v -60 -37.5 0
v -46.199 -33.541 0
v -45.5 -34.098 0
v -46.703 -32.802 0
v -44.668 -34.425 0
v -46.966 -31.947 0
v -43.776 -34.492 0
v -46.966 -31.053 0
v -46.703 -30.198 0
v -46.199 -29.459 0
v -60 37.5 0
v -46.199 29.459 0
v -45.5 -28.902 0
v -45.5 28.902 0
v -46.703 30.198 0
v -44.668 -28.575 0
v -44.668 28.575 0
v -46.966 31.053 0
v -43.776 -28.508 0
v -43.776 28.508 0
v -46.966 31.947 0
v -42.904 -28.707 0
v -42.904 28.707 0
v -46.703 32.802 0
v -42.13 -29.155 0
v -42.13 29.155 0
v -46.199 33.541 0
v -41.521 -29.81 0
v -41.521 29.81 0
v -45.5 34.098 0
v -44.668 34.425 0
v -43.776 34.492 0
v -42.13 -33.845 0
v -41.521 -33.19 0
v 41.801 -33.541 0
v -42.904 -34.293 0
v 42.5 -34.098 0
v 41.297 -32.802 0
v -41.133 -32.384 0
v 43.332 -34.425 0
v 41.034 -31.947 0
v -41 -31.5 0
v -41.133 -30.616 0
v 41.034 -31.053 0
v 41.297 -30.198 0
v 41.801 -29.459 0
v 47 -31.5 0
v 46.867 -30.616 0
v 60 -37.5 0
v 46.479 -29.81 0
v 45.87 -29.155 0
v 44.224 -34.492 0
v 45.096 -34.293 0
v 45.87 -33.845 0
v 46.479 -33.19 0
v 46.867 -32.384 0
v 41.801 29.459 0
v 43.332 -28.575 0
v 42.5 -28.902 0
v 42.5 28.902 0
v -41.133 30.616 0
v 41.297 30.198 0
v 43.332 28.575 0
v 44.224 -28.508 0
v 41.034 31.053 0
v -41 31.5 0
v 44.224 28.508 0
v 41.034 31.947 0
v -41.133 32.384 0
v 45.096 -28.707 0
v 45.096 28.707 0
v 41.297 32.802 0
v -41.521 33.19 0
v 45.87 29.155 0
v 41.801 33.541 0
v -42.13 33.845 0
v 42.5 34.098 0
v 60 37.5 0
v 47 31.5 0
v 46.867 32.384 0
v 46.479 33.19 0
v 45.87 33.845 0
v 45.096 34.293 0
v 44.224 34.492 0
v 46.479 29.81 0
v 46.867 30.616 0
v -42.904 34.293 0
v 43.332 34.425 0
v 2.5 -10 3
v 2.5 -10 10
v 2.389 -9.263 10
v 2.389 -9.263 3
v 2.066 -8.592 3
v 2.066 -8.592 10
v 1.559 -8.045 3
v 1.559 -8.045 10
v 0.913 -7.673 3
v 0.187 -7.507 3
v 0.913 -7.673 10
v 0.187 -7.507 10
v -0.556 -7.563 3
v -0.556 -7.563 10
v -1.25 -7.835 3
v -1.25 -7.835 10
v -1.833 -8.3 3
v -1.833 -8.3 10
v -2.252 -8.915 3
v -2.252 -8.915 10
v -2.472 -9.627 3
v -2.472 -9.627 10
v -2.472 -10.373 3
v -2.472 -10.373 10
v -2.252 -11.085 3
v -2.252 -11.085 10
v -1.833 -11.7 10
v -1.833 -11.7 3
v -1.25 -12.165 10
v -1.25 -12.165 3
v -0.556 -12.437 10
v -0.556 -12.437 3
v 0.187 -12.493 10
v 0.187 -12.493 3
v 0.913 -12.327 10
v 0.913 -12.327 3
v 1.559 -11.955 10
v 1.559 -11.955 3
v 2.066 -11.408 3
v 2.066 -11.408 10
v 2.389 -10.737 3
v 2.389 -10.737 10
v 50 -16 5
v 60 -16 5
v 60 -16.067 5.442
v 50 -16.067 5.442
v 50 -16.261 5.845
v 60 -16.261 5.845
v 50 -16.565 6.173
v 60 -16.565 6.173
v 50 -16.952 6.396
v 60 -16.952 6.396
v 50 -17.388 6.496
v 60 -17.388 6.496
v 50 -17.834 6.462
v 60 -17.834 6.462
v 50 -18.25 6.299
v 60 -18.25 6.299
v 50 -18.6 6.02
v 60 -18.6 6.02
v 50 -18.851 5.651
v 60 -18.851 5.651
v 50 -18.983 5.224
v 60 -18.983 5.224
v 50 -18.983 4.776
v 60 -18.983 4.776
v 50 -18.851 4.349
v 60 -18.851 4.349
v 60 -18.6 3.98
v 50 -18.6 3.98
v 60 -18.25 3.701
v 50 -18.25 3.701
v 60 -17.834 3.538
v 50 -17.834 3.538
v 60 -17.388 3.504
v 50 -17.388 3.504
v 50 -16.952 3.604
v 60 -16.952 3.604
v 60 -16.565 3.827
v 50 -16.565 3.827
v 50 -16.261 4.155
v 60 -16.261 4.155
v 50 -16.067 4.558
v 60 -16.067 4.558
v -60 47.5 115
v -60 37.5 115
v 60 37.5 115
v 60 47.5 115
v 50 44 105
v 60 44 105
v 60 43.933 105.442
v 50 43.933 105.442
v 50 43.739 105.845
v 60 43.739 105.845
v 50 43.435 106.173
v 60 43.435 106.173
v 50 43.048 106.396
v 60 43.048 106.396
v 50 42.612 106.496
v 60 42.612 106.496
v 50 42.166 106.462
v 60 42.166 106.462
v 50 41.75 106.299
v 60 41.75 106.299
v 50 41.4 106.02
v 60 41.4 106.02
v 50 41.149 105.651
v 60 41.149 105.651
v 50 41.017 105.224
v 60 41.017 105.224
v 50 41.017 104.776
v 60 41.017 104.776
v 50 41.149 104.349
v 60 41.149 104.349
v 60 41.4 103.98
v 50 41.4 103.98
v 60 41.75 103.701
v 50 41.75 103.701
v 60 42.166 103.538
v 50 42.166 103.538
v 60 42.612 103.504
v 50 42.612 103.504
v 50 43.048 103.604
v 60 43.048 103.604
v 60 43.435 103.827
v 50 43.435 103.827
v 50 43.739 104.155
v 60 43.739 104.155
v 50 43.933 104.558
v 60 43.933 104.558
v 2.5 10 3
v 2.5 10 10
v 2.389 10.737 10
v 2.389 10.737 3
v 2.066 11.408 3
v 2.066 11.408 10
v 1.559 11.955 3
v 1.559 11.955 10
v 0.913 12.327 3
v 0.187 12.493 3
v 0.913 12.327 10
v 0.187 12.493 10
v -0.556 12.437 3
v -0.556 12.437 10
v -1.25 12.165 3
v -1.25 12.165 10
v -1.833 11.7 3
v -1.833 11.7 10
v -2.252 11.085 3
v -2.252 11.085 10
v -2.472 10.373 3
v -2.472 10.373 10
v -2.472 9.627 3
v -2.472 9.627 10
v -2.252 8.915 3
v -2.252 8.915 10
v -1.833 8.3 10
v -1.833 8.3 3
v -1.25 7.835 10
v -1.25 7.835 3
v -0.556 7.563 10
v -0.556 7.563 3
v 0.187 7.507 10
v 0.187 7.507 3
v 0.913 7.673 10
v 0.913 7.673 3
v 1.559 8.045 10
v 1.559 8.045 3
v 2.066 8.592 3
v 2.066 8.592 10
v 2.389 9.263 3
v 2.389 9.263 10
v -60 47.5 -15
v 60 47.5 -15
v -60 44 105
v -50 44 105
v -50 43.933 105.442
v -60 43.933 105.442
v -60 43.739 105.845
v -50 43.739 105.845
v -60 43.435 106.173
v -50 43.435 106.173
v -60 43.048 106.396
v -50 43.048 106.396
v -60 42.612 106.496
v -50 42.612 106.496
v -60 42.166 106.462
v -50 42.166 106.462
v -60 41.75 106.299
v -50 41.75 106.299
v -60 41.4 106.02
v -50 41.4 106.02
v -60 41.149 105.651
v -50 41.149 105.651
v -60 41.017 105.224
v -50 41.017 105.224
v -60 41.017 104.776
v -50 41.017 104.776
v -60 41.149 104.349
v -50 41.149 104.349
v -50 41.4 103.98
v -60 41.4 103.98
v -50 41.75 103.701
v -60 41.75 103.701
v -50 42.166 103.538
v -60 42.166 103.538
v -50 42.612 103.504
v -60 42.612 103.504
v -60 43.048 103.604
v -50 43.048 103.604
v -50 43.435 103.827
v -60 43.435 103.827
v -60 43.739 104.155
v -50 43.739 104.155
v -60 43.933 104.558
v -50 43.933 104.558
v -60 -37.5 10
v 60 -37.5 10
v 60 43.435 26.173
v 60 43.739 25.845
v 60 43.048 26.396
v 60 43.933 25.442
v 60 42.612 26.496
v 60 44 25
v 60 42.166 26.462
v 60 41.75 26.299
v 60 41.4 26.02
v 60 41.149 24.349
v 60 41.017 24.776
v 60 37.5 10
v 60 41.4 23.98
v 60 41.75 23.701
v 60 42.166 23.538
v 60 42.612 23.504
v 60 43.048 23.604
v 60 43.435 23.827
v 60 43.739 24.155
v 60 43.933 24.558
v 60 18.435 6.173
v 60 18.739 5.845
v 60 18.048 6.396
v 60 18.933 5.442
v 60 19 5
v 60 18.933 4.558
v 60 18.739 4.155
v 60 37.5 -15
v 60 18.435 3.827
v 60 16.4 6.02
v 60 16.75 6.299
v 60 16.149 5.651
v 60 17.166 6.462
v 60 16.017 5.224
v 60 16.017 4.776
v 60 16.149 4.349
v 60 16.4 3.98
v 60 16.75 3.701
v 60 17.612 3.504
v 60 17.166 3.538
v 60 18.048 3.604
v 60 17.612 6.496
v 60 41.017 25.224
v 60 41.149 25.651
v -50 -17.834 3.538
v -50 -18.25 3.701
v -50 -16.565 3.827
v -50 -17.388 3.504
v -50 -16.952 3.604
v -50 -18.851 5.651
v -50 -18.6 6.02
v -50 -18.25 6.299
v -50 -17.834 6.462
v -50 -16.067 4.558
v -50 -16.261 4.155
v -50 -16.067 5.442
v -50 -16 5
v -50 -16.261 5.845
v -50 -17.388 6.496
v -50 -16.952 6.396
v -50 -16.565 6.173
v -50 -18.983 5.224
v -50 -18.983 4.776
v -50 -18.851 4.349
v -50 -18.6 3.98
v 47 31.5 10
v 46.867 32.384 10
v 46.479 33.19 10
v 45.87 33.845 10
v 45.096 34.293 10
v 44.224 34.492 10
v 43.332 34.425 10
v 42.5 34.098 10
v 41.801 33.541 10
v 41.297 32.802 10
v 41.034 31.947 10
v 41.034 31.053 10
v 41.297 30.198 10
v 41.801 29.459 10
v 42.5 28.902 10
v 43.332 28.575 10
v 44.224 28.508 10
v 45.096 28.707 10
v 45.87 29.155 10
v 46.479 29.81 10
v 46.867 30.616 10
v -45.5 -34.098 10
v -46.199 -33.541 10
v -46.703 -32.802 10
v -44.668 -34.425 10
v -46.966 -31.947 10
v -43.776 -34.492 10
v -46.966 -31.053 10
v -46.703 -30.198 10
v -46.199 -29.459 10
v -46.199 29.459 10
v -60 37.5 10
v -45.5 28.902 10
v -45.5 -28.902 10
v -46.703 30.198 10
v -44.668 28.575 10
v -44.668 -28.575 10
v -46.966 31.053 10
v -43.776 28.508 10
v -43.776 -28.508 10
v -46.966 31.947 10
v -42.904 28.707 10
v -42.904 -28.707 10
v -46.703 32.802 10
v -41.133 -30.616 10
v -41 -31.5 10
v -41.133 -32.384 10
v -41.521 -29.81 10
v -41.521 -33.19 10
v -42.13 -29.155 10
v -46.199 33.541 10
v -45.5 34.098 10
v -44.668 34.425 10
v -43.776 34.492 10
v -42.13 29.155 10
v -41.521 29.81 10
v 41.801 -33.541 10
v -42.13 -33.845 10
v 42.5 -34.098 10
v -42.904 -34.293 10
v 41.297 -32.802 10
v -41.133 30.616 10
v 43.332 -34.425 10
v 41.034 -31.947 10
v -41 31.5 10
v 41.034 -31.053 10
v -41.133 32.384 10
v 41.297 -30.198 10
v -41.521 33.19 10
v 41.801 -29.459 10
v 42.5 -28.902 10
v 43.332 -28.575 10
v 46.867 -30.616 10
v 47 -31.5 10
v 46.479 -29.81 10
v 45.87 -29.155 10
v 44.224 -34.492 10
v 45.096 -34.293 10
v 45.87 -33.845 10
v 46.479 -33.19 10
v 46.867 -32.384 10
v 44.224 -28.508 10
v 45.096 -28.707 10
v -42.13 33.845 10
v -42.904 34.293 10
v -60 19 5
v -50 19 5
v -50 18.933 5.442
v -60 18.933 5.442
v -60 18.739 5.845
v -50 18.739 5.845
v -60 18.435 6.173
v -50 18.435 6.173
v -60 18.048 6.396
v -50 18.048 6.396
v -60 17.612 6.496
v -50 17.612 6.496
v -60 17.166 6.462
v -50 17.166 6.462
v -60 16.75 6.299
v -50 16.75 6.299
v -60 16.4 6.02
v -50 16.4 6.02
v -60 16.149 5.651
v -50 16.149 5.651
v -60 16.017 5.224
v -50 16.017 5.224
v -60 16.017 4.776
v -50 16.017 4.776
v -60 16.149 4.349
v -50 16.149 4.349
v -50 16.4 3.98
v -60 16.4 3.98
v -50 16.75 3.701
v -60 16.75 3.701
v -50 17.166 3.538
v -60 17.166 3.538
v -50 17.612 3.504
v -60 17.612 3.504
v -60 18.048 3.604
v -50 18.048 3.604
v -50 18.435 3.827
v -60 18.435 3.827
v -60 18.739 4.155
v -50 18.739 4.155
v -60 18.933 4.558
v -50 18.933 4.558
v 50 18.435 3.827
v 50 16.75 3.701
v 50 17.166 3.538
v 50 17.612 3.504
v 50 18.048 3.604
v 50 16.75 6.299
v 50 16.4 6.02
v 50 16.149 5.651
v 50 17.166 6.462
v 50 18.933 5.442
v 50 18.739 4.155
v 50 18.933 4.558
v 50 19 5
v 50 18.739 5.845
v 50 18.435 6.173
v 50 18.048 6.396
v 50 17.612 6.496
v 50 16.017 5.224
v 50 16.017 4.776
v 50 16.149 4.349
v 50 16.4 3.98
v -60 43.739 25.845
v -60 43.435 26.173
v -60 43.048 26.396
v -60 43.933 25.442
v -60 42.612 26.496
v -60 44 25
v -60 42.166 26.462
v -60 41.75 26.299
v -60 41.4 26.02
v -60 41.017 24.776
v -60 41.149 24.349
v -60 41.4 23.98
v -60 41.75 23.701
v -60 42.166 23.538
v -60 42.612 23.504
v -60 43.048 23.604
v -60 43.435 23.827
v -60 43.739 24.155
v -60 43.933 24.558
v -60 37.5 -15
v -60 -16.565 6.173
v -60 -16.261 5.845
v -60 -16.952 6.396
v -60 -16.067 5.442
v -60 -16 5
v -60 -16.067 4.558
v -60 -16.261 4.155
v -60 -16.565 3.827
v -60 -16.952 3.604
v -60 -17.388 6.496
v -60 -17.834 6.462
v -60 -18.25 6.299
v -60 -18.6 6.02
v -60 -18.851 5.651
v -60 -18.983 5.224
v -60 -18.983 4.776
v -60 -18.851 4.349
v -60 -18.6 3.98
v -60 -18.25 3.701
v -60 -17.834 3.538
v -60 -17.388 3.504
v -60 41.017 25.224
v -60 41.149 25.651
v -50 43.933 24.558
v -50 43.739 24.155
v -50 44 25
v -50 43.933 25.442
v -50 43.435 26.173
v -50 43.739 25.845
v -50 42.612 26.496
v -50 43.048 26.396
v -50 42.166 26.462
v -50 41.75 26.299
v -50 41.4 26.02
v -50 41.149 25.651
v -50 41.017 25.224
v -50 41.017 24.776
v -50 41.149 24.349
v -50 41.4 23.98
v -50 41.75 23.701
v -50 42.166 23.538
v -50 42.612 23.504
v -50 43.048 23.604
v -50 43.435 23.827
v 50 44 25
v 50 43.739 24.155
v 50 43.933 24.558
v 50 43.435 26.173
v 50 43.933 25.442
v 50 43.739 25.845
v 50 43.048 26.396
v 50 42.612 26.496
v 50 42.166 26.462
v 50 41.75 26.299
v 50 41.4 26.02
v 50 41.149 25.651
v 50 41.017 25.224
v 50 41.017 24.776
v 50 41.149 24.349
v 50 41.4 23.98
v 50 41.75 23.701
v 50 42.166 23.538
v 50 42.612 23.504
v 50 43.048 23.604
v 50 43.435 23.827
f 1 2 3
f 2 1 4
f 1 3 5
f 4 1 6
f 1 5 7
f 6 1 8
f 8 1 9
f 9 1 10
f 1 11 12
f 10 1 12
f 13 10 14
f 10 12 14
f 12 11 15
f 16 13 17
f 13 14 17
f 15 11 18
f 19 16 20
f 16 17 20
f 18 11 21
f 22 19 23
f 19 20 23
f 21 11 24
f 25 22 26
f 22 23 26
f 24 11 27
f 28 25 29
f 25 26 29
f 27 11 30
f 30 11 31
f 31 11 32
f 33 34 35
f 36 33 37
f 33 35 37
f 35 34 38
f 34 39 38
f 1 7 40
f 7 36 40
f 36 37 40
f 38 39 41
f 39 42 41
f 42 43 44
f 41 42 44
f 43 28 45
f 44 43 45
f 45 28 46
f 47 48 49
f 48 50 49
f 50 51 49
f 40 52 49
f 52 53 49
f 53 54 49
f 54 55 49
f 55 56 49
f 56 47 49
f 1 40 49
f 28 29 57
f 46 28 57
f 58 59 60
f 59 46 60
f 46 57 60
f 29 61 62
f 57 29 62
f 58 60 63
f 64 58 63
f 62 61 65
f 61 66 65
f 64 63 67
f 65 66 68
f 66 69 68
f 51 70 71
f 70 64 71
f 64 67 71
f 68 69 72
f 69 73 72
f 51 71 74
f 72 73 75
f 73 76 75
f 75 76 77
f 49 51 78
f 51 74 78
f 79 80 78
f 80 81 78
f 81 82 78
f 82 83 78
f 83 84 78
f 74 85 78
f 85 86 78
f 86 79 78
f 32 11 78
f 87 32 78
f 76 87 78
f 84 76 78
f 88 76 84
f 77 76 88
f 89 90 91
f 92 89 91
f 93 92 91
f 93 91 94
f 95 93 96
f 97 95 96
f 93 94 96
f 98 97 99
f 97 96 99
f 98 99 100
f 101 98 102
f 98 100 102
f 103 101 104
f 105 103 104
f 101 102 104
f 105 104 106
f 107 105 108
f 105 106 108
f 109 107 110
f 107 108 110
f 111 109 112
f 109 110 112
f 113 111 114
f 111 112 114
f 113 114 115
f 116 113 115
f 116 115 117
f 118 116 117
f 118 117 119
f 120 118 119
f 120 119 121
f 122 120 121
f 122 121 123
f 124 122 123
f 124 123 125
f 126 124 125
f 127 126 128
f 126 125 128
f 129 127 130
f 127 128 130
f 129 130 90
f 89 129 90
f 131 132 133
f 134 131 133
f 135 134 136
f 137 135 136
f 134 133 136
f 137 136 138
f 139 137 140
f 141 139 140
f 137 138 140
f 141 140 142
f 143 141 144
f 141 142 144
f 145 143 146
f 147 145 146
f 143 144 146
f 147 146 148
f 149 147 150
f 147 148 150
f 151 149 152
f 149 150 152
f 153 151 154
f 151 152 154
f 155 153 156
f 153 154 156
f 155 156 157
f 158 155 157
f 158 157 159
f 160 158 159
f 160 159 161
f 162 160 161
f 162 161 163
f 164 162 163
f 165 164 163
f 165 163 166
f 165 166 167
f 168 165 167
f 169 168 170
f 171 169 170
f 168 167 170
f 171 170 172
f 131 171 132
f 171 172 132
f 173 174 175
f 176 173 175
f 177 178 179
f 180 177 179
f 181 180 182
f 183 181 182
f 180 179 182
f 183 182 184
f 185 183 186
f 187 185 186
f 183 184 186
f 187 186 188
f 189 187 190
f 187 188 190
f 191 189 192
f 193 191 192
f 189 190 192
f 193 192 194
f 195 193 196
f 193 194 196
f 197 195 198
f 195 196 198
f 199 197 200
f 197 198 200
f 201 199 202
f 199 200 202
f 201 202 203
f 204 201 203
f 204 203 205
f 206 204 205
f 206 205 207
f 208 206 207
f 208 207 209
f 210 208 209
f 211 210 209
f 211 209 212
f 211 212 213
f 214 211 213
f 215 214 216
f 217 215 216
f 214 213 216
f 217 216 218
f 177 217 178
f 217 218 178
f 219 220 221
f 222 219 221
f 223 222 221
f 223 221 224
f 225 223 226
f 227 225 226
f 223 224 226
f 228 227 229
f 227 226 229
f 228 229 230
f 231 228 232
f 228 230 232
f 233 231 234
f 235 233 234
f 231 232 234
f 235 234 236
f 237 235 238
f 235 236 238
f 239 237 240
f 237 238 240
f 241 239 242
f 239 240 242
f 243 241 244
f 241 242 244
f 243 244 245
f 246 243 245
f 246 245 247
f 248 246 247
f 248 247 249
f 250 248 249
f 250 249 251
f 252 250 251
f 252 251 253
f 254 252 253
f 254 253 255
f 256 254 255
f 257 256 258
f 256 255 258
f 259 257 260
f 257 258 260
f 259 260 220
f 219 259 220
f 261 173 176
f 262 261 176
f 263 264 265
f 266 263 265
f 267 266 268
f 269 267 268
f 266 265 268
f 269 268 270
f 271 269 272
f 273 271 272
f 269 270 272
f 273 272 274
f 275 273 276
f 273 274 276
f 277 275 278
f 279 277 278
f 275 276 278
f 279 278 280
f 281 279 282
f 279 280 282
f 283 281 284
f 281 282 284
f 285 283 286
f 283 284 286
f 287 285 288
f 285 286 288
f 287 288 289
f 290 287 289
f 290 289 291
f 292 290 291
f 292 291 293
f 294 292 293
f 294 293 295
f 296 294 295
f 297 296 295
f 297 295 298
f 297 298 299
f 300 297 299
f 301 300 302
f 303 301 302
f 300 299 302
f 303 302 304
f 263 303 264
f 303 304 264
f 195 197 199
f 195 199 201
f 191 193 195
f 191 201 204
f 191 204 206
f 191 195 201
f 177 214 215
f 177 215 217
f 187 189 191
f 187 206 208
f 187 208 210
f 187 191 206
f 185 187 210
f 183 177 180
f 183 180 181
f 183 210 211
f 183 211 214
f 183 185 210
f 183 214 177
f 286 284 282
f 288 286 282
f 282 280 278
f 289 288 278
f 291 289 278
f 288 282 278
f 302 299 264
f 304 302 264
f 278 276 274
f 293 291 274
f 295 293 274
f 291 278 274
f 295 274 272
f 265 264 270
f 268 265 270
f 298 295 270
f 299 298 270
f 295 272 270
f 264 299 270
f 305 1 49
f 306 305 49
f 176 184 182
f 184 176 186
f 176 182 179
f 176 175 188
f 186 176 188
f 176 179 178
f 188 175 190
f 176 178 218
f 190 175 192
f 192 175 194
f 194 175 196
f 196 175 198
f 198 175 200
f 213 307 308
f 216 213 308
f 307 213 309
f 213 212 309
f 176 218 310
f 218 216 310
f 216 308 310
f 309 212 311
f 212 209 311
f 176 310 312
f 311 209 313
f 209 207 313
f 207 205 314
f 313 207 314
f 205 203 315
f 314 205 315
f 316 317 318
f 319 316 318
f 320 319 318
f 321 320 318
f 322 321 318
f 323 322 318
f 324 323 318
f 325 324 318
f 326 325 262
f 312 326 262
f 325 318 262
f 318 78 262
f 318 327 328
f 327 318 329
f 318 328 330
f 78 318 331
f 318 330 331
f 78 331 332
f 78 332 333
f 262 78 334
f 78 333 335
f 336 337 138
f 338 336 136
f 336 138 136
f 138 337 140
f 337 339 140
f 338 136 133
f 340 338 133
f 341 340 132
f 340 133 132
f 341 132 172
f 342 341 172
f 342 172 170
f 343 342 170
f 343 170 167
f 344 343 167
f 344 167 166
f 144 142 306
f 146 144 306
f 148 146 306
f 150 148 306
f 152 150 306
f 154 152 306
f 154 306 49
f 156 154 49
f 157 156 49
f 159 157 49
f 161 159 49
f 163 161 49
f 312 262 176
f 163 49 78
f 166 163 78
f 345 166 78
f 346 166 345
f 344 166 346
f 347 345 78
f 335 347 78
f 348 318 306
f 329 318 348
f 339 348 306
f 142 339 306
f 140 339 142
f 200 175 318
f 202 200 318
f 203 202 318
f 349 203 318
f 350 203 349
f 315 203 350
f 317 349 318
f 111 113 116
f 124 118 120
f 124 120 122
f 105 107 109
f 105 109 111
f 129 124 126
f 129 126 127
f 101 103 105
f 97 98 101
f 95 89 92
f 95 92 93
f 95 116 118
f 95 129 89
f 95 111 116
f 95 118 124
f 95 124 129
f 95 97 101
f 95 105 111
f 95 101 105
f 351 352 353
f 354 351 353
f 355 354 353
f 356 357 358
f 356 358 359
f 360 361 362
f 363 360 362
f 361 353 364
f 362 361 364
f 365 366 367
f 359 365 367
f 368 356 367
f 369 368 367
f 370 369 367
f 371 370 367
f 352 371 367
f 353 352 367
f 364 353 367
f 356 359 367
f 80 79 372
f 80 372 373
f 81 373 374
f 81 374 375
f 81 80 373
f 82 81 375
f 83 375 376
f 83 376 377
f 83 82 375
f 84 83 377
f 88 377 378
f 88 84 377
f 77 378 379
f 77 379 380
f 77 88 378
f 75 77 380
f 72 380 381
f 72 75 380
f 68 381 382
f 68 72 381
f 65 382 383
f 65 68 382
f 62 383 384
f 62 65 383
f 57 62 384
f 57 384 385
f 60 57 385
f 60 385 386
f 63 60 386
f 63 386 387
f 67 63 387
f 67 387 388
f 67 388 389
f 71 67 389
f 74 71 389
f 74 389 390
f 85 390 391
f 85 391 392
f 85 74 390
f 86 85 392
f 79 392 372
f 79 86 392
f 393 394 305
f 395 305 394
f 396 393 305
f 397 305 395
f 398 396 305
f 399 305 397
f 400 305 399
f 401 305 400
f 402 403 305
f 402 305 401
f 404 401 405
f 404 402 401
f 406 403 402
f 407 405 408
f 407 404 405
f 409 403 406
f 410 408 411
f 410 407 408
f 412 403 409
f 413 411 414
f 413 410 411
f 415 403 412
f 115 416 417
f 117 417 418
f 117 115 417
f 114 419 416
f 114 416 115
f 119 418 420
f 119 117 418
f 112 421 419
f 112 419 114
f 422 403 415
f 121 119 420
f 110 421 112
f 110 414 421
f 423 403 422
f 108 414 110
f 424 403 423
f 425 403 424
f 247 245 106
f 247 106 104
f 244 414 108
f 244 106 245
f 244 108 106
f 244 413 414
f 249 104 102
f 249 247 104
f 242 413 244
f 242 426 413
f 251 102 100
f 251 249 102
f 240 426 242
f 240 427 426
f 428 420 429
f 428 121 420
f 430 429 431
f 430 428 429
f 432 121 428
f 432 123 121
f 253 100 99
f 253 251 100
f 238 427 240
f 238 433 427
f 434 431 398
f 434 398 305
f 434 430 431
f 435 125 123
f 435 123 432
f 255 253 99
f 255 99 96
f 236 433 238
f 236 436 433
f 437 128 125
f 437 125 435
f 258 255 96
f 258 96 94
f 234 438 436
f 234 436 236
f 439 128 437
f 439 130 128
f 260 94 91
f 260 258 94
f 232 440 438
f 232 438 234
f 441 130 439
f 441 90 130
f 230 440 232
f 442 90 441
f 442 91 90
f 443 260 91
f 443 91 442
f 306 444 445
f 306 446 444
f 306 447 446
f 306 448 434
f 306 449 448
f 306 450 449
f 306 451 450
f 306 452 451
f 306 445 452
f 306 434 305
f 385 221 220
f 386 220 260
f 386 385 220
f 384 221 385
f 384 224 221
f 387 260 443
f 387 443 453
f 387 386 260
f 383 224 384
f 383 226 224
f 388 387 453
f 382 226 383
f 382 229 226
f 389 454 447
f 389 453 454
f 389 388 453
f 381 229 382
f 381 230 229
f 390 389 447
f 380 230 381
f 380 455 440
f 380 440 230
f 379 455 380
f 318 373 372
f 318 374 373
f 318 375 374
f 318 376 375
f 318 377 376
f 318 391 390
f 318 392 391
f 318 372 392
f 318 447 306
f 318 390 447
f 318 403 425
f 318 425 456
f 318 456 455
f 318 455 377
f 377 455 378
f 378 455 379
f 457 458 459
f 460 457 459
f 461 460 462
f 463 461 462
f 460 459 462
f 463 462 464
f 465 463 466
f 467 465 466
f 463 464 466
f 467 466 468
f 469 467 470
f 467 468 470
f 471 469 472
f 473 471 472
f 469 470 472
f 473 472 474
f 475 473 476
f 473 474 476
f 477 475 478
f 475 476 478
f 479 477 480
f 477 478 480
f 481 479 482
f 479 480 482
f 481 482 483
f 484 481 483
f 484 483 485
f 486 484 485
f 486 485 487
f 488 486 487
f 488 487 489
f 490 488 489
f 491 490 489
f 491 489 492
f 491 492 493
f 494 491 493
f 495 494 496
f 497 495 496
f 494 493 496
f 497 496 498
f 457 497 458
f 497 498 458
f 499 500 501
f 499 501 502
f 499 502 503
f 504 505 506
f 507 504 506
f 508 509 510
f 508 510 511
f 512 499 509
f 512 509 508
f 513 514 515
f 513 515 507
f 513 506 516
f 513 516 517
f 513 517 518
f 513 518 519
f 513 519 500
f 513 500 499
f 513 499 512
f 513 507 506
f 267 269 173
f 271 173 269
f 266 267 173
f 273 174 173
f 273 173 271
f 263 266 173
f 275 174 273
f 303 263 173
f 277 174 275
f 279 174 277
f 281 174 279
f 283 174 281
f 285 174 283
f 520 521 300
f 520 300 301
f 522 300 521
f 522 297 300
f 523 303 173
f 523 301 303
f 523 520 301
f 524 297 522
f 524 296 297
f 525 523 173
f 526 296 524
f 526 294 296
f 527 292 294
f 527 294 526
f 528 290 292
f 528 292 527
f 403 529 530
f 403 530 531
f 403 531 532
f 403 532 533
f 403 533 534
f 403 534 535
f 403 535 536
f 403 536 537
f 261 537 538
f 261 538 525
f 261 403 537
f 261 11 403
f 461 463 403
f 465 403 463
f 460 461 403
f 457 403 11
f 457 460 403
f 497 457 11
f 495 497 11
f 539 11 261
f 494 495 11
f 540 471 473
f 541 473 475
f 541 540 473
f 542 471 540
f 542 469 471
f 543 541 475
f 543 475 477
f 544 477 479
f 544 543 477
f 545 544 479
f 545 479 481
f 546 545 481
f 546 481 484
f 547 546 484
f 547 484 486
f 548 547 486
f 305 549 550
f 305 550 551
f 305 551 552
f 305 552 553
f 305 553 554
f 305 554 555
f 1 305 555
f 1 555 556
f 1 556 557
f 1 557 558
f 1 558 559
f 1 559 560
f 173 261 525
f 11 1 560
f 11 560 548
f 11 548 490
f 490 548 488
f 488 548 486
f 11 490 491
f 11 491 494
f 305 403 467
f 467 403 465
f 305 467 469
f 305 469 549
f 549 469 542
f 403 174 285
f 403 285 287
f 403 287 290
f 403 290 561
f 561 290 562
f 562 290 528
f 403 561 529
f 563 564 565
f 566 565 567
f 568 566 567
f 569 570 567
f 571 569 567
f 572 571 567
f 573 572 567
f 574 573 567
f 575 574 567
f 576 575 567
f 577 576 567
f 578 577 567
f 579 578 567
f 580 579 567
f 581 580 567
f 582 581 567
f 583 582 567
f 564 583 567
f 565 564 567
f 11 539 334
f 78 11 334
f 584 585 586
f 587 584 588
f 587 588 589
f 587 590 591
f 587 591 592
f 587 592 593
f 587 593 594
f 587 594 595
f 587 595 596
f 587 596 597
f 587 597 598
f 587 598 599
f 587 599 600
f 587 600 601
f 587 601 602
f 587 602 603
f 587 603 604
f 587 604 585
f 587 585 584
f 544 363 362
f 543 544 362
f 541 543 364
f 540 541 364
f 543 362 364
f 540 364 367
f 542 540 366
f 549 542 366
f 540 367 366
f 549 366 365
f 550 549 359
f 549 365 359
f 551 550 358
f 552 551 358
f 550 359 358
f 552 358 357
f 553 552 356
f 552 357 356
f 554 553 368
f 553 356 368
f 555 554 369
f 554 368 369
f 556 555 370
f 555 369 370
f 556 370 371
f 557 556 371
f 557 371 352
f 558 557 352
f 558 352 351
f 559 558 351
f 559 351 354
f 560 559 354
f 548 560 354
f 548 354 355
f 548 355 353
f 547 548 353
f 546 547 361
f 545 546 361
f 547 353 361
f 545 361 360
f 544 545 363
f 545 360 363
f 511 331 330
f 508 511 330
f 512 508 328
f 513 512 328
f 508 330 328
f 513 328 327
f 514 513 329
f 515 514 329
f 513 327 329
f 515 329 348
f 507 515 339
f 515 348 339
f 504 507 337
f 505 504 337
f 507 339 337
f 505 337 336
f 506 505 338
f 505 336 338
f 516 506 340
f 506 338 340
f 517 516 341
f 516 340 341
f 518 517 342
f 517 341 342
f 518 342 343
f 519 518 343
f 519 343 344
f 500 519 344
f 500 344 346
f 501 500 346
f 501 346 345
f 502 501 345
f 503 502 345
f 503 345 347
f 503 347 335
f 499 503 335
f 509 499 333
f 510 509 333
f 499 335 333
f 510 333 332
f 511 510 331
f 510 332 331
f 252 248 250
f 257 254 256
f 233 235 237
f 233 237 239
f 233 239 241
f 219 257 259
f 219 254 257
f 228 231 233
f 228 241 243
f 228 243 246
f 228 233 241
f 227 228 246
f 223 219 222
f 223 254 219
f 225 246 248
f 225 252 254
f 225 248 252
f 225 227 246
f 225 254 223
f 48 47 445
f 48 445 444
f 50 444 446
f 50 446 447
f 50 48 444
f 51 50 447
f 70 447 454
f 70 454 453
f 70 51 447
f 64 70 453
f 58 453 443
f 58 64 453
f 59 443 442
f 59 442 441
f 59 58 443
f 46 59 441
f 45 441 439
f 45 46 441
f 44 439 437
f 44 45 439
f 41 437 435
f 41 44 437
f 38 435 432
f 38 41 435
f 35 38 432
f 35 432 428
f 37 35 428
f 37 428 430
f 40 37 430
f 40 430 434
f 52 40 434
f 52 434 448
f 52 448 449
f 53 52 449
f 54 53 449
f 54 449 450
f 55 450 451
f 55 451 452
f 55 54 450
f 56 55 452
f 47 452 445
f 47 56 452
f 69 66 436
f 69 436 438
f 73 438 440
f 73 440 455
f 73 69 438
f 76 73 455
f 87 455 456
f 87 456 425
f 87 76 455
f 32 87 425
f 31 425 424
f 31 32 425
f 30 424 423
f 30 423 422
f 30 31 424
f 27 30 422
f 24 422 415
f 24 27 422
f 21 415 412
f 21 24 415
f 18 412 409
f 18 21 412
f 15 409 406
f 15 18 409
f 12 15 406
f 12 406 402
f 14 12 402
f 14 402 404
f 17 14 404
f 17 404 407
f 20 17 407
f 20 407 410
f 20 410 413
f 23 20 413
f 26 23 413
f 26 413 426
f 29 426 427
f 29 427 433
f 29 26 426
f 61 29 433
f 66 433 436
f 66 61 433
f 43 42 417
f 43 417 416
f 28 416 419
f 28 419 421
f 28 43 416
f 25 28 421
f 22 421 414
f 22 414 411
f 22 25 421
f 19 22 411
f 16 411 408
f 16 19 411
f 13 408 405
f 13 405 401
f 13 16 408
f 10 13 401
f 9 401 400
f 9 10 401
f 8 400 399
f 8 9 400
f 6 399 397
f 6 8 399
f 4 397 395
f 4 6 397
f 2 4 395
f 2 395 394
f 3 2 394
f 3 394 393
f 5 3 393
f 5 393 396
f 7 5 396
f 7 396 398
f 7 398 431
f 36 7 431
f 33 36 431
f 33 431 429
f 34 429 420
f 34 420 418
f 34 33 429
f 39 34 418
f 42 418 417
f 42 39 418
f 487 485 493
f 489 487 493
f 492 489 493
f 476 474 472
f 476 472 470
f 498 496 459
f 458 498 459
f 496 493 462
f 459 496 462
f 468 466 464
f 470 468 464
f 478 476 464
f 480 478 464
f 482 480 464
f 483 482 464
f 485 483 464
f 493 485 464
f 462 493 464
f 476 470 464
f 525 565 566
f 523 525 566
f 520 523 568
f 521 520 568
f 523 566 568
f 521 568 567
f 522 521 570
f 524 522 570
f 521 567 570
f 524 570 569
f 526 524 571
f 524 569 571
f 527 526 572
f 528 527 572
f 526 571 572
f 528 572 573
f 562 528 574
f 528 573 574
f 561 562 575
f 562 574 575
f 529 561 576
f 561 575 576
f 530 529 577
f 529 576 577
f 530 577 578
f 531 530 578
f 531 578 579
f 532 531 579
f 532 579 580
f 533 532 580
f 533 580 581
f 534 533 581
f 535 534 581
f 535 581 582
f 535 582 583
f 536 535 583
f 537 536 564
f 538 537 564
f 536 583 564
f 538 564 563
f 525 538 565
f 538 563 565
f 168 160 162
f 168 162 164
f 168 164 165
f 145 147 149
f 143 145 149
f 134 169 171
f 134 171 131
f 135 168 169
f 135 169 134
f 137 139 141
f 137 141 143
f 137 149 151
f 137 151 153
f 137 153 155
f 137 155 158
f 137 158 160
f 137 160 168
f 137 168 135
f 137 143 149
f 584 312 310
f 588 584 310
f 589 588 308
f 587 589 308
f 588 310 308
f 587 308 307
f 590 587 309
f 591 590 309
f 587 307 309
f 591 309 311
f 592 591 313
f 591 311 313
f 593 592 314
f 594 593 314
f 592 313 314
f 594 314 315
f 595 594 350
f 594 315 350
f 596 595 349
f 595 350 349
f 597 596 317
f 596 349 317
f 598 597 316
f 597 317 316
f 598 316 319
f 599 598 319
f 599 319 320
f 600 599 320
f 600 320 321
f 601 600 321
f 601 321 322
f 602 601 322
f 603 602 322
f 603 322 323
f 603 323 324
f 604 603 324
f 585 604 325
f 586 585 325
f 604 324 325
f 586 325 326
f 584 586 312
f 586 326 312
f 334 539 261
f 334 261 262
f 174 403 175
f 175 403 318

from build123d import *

# Parameters (mm, degrees)
SKETCH1_W           = 120
SKETCH1_H           = 75
SKETCH1_R           = 3
BOSS_EXTRUDE1_DEPTH = 10
SKETCH2_R           = 2.5
CUT_EXTRUDE1_DEPTH  = 7
SKETCH3_R           = 1.5
CUT_EXTRUDE2_DEPTH  = 10
LPATTERN1_COUNT     = 2
LPATTERN1_PITCH     = 110
SKETCH4_W           = 120
SKETCH4_H           = 130
BOSS_EXTRUDE2_DEPTH = 10
SKETCH5_R           = 1.5
CUT_EXTRUDE3_DEPTH  = 10
LPATTERN2_COUNT     = 2
LPATTERN2_PITCH     = 110


with BuildPart() as part:
    # Sketch1 → Boss-Extrude1 (new body)
    with BuildSketch(Plane.XY):
        Rectangle(SKETCH1_W, SKETCH1_H)
        with Locations((-44, 31.5)):
            Circle(SKETCH1_R, mode=Mode.SUBTRACT)
        with Locations((44, 31.5)):
            Circle(SKETCH1_R, mode=Mode.SUBTRACT)
        with Locations((-44, -31.5)):
            Circle(SKETCH1_R, mode=Mode.SUBTRACT)
        with Locations((44, -31.5)):
            Circle(SKETCH1_R, mode=Mode.SUBTRACT)
    extrude(amount=BOSS_EXTRUDE1_DEPTH)

    # Sketch2 → Cut-Extrude1 (cut)
    with BuildSketch(Plane.XY.offset(10)):
        with Locations((0, 10)):
            Circle(SKETCH2_R)
        with Locations((0, -10)):
            Circle(SKETCH2_R)
    extrude(amount=-CUT_EXTRUDE1_DEPTH, mode=Mode.SUBTRACT)

    # Sketch3 → Cut-Extrude2 (cut)
    with BuildSketch(Plane(origin=(60, 0, 0), x_dir=(0, 0, -1), z_dir=(1, 0, 0))):
        with Locations(Location((-5, 17.5, 0), (0, 0, 90))):
            Circle(SKETCH3_R)
        with Locations(Location((-5, -17.5, 0), (0, 0, 90))):
            Circle(SKETCH3_R)
    cut_extrude2 = extrude(amount=-CUT_EXTRUDE2_DEPTH, mode=Mode.SUBTRACT)

    # LPattern1: Cut-Extrude2 ×2
    with Locations(*[(-i * LPATTERN1_PITCH, 0, 0) for i in range(1, LPATTERN1_COUNT)]):
        add(cut_extrude2, mode=Mode.SUBTRACT)

    # Sketch4 → Boss-Extrude2 (add)
    with BuildSketch(Plane(origin=(0, 37.5, 0), x_dir=(1, 0, 0), z_dir=(0, 1, 0))):
        with Locations((0, -50)):
            Rectangle(SKETCH4_W, SKETCH4_H)
    extrude(amount=BOSS_EXTRUDE2_DEPTH)

    # Sketch5 → Cut-Extrude3 (cut)
    with BuildSketch(Plane(origin=(60, 0, 0), x_dir=(0, 0, -1), z_dir=(1, 0, 0))):
        with Locations(Location((-105, 42.5, 0), (0, 0, 90))):
            Circle(SKETCH5_R)
        with Locations(Location((-25, 42.5, 0), (0, 0, 90))):
            Circle(SKETCH5_R)
    cut_extrude3 = extrude(amount=-CUT_EXTRUDE3_DEPTH, mode=Mode.SUBTRACT)

    # LPattern2: Cut-Extrude3 ×2
    with Locations(*[(-i * LPATTERN2_PITCH, 0, 0) for i in range(1, LPATTERN2_COUNT)]):
        add(cut_extrude3, mode=Mode.SUBTRACT)


solid = part.part
